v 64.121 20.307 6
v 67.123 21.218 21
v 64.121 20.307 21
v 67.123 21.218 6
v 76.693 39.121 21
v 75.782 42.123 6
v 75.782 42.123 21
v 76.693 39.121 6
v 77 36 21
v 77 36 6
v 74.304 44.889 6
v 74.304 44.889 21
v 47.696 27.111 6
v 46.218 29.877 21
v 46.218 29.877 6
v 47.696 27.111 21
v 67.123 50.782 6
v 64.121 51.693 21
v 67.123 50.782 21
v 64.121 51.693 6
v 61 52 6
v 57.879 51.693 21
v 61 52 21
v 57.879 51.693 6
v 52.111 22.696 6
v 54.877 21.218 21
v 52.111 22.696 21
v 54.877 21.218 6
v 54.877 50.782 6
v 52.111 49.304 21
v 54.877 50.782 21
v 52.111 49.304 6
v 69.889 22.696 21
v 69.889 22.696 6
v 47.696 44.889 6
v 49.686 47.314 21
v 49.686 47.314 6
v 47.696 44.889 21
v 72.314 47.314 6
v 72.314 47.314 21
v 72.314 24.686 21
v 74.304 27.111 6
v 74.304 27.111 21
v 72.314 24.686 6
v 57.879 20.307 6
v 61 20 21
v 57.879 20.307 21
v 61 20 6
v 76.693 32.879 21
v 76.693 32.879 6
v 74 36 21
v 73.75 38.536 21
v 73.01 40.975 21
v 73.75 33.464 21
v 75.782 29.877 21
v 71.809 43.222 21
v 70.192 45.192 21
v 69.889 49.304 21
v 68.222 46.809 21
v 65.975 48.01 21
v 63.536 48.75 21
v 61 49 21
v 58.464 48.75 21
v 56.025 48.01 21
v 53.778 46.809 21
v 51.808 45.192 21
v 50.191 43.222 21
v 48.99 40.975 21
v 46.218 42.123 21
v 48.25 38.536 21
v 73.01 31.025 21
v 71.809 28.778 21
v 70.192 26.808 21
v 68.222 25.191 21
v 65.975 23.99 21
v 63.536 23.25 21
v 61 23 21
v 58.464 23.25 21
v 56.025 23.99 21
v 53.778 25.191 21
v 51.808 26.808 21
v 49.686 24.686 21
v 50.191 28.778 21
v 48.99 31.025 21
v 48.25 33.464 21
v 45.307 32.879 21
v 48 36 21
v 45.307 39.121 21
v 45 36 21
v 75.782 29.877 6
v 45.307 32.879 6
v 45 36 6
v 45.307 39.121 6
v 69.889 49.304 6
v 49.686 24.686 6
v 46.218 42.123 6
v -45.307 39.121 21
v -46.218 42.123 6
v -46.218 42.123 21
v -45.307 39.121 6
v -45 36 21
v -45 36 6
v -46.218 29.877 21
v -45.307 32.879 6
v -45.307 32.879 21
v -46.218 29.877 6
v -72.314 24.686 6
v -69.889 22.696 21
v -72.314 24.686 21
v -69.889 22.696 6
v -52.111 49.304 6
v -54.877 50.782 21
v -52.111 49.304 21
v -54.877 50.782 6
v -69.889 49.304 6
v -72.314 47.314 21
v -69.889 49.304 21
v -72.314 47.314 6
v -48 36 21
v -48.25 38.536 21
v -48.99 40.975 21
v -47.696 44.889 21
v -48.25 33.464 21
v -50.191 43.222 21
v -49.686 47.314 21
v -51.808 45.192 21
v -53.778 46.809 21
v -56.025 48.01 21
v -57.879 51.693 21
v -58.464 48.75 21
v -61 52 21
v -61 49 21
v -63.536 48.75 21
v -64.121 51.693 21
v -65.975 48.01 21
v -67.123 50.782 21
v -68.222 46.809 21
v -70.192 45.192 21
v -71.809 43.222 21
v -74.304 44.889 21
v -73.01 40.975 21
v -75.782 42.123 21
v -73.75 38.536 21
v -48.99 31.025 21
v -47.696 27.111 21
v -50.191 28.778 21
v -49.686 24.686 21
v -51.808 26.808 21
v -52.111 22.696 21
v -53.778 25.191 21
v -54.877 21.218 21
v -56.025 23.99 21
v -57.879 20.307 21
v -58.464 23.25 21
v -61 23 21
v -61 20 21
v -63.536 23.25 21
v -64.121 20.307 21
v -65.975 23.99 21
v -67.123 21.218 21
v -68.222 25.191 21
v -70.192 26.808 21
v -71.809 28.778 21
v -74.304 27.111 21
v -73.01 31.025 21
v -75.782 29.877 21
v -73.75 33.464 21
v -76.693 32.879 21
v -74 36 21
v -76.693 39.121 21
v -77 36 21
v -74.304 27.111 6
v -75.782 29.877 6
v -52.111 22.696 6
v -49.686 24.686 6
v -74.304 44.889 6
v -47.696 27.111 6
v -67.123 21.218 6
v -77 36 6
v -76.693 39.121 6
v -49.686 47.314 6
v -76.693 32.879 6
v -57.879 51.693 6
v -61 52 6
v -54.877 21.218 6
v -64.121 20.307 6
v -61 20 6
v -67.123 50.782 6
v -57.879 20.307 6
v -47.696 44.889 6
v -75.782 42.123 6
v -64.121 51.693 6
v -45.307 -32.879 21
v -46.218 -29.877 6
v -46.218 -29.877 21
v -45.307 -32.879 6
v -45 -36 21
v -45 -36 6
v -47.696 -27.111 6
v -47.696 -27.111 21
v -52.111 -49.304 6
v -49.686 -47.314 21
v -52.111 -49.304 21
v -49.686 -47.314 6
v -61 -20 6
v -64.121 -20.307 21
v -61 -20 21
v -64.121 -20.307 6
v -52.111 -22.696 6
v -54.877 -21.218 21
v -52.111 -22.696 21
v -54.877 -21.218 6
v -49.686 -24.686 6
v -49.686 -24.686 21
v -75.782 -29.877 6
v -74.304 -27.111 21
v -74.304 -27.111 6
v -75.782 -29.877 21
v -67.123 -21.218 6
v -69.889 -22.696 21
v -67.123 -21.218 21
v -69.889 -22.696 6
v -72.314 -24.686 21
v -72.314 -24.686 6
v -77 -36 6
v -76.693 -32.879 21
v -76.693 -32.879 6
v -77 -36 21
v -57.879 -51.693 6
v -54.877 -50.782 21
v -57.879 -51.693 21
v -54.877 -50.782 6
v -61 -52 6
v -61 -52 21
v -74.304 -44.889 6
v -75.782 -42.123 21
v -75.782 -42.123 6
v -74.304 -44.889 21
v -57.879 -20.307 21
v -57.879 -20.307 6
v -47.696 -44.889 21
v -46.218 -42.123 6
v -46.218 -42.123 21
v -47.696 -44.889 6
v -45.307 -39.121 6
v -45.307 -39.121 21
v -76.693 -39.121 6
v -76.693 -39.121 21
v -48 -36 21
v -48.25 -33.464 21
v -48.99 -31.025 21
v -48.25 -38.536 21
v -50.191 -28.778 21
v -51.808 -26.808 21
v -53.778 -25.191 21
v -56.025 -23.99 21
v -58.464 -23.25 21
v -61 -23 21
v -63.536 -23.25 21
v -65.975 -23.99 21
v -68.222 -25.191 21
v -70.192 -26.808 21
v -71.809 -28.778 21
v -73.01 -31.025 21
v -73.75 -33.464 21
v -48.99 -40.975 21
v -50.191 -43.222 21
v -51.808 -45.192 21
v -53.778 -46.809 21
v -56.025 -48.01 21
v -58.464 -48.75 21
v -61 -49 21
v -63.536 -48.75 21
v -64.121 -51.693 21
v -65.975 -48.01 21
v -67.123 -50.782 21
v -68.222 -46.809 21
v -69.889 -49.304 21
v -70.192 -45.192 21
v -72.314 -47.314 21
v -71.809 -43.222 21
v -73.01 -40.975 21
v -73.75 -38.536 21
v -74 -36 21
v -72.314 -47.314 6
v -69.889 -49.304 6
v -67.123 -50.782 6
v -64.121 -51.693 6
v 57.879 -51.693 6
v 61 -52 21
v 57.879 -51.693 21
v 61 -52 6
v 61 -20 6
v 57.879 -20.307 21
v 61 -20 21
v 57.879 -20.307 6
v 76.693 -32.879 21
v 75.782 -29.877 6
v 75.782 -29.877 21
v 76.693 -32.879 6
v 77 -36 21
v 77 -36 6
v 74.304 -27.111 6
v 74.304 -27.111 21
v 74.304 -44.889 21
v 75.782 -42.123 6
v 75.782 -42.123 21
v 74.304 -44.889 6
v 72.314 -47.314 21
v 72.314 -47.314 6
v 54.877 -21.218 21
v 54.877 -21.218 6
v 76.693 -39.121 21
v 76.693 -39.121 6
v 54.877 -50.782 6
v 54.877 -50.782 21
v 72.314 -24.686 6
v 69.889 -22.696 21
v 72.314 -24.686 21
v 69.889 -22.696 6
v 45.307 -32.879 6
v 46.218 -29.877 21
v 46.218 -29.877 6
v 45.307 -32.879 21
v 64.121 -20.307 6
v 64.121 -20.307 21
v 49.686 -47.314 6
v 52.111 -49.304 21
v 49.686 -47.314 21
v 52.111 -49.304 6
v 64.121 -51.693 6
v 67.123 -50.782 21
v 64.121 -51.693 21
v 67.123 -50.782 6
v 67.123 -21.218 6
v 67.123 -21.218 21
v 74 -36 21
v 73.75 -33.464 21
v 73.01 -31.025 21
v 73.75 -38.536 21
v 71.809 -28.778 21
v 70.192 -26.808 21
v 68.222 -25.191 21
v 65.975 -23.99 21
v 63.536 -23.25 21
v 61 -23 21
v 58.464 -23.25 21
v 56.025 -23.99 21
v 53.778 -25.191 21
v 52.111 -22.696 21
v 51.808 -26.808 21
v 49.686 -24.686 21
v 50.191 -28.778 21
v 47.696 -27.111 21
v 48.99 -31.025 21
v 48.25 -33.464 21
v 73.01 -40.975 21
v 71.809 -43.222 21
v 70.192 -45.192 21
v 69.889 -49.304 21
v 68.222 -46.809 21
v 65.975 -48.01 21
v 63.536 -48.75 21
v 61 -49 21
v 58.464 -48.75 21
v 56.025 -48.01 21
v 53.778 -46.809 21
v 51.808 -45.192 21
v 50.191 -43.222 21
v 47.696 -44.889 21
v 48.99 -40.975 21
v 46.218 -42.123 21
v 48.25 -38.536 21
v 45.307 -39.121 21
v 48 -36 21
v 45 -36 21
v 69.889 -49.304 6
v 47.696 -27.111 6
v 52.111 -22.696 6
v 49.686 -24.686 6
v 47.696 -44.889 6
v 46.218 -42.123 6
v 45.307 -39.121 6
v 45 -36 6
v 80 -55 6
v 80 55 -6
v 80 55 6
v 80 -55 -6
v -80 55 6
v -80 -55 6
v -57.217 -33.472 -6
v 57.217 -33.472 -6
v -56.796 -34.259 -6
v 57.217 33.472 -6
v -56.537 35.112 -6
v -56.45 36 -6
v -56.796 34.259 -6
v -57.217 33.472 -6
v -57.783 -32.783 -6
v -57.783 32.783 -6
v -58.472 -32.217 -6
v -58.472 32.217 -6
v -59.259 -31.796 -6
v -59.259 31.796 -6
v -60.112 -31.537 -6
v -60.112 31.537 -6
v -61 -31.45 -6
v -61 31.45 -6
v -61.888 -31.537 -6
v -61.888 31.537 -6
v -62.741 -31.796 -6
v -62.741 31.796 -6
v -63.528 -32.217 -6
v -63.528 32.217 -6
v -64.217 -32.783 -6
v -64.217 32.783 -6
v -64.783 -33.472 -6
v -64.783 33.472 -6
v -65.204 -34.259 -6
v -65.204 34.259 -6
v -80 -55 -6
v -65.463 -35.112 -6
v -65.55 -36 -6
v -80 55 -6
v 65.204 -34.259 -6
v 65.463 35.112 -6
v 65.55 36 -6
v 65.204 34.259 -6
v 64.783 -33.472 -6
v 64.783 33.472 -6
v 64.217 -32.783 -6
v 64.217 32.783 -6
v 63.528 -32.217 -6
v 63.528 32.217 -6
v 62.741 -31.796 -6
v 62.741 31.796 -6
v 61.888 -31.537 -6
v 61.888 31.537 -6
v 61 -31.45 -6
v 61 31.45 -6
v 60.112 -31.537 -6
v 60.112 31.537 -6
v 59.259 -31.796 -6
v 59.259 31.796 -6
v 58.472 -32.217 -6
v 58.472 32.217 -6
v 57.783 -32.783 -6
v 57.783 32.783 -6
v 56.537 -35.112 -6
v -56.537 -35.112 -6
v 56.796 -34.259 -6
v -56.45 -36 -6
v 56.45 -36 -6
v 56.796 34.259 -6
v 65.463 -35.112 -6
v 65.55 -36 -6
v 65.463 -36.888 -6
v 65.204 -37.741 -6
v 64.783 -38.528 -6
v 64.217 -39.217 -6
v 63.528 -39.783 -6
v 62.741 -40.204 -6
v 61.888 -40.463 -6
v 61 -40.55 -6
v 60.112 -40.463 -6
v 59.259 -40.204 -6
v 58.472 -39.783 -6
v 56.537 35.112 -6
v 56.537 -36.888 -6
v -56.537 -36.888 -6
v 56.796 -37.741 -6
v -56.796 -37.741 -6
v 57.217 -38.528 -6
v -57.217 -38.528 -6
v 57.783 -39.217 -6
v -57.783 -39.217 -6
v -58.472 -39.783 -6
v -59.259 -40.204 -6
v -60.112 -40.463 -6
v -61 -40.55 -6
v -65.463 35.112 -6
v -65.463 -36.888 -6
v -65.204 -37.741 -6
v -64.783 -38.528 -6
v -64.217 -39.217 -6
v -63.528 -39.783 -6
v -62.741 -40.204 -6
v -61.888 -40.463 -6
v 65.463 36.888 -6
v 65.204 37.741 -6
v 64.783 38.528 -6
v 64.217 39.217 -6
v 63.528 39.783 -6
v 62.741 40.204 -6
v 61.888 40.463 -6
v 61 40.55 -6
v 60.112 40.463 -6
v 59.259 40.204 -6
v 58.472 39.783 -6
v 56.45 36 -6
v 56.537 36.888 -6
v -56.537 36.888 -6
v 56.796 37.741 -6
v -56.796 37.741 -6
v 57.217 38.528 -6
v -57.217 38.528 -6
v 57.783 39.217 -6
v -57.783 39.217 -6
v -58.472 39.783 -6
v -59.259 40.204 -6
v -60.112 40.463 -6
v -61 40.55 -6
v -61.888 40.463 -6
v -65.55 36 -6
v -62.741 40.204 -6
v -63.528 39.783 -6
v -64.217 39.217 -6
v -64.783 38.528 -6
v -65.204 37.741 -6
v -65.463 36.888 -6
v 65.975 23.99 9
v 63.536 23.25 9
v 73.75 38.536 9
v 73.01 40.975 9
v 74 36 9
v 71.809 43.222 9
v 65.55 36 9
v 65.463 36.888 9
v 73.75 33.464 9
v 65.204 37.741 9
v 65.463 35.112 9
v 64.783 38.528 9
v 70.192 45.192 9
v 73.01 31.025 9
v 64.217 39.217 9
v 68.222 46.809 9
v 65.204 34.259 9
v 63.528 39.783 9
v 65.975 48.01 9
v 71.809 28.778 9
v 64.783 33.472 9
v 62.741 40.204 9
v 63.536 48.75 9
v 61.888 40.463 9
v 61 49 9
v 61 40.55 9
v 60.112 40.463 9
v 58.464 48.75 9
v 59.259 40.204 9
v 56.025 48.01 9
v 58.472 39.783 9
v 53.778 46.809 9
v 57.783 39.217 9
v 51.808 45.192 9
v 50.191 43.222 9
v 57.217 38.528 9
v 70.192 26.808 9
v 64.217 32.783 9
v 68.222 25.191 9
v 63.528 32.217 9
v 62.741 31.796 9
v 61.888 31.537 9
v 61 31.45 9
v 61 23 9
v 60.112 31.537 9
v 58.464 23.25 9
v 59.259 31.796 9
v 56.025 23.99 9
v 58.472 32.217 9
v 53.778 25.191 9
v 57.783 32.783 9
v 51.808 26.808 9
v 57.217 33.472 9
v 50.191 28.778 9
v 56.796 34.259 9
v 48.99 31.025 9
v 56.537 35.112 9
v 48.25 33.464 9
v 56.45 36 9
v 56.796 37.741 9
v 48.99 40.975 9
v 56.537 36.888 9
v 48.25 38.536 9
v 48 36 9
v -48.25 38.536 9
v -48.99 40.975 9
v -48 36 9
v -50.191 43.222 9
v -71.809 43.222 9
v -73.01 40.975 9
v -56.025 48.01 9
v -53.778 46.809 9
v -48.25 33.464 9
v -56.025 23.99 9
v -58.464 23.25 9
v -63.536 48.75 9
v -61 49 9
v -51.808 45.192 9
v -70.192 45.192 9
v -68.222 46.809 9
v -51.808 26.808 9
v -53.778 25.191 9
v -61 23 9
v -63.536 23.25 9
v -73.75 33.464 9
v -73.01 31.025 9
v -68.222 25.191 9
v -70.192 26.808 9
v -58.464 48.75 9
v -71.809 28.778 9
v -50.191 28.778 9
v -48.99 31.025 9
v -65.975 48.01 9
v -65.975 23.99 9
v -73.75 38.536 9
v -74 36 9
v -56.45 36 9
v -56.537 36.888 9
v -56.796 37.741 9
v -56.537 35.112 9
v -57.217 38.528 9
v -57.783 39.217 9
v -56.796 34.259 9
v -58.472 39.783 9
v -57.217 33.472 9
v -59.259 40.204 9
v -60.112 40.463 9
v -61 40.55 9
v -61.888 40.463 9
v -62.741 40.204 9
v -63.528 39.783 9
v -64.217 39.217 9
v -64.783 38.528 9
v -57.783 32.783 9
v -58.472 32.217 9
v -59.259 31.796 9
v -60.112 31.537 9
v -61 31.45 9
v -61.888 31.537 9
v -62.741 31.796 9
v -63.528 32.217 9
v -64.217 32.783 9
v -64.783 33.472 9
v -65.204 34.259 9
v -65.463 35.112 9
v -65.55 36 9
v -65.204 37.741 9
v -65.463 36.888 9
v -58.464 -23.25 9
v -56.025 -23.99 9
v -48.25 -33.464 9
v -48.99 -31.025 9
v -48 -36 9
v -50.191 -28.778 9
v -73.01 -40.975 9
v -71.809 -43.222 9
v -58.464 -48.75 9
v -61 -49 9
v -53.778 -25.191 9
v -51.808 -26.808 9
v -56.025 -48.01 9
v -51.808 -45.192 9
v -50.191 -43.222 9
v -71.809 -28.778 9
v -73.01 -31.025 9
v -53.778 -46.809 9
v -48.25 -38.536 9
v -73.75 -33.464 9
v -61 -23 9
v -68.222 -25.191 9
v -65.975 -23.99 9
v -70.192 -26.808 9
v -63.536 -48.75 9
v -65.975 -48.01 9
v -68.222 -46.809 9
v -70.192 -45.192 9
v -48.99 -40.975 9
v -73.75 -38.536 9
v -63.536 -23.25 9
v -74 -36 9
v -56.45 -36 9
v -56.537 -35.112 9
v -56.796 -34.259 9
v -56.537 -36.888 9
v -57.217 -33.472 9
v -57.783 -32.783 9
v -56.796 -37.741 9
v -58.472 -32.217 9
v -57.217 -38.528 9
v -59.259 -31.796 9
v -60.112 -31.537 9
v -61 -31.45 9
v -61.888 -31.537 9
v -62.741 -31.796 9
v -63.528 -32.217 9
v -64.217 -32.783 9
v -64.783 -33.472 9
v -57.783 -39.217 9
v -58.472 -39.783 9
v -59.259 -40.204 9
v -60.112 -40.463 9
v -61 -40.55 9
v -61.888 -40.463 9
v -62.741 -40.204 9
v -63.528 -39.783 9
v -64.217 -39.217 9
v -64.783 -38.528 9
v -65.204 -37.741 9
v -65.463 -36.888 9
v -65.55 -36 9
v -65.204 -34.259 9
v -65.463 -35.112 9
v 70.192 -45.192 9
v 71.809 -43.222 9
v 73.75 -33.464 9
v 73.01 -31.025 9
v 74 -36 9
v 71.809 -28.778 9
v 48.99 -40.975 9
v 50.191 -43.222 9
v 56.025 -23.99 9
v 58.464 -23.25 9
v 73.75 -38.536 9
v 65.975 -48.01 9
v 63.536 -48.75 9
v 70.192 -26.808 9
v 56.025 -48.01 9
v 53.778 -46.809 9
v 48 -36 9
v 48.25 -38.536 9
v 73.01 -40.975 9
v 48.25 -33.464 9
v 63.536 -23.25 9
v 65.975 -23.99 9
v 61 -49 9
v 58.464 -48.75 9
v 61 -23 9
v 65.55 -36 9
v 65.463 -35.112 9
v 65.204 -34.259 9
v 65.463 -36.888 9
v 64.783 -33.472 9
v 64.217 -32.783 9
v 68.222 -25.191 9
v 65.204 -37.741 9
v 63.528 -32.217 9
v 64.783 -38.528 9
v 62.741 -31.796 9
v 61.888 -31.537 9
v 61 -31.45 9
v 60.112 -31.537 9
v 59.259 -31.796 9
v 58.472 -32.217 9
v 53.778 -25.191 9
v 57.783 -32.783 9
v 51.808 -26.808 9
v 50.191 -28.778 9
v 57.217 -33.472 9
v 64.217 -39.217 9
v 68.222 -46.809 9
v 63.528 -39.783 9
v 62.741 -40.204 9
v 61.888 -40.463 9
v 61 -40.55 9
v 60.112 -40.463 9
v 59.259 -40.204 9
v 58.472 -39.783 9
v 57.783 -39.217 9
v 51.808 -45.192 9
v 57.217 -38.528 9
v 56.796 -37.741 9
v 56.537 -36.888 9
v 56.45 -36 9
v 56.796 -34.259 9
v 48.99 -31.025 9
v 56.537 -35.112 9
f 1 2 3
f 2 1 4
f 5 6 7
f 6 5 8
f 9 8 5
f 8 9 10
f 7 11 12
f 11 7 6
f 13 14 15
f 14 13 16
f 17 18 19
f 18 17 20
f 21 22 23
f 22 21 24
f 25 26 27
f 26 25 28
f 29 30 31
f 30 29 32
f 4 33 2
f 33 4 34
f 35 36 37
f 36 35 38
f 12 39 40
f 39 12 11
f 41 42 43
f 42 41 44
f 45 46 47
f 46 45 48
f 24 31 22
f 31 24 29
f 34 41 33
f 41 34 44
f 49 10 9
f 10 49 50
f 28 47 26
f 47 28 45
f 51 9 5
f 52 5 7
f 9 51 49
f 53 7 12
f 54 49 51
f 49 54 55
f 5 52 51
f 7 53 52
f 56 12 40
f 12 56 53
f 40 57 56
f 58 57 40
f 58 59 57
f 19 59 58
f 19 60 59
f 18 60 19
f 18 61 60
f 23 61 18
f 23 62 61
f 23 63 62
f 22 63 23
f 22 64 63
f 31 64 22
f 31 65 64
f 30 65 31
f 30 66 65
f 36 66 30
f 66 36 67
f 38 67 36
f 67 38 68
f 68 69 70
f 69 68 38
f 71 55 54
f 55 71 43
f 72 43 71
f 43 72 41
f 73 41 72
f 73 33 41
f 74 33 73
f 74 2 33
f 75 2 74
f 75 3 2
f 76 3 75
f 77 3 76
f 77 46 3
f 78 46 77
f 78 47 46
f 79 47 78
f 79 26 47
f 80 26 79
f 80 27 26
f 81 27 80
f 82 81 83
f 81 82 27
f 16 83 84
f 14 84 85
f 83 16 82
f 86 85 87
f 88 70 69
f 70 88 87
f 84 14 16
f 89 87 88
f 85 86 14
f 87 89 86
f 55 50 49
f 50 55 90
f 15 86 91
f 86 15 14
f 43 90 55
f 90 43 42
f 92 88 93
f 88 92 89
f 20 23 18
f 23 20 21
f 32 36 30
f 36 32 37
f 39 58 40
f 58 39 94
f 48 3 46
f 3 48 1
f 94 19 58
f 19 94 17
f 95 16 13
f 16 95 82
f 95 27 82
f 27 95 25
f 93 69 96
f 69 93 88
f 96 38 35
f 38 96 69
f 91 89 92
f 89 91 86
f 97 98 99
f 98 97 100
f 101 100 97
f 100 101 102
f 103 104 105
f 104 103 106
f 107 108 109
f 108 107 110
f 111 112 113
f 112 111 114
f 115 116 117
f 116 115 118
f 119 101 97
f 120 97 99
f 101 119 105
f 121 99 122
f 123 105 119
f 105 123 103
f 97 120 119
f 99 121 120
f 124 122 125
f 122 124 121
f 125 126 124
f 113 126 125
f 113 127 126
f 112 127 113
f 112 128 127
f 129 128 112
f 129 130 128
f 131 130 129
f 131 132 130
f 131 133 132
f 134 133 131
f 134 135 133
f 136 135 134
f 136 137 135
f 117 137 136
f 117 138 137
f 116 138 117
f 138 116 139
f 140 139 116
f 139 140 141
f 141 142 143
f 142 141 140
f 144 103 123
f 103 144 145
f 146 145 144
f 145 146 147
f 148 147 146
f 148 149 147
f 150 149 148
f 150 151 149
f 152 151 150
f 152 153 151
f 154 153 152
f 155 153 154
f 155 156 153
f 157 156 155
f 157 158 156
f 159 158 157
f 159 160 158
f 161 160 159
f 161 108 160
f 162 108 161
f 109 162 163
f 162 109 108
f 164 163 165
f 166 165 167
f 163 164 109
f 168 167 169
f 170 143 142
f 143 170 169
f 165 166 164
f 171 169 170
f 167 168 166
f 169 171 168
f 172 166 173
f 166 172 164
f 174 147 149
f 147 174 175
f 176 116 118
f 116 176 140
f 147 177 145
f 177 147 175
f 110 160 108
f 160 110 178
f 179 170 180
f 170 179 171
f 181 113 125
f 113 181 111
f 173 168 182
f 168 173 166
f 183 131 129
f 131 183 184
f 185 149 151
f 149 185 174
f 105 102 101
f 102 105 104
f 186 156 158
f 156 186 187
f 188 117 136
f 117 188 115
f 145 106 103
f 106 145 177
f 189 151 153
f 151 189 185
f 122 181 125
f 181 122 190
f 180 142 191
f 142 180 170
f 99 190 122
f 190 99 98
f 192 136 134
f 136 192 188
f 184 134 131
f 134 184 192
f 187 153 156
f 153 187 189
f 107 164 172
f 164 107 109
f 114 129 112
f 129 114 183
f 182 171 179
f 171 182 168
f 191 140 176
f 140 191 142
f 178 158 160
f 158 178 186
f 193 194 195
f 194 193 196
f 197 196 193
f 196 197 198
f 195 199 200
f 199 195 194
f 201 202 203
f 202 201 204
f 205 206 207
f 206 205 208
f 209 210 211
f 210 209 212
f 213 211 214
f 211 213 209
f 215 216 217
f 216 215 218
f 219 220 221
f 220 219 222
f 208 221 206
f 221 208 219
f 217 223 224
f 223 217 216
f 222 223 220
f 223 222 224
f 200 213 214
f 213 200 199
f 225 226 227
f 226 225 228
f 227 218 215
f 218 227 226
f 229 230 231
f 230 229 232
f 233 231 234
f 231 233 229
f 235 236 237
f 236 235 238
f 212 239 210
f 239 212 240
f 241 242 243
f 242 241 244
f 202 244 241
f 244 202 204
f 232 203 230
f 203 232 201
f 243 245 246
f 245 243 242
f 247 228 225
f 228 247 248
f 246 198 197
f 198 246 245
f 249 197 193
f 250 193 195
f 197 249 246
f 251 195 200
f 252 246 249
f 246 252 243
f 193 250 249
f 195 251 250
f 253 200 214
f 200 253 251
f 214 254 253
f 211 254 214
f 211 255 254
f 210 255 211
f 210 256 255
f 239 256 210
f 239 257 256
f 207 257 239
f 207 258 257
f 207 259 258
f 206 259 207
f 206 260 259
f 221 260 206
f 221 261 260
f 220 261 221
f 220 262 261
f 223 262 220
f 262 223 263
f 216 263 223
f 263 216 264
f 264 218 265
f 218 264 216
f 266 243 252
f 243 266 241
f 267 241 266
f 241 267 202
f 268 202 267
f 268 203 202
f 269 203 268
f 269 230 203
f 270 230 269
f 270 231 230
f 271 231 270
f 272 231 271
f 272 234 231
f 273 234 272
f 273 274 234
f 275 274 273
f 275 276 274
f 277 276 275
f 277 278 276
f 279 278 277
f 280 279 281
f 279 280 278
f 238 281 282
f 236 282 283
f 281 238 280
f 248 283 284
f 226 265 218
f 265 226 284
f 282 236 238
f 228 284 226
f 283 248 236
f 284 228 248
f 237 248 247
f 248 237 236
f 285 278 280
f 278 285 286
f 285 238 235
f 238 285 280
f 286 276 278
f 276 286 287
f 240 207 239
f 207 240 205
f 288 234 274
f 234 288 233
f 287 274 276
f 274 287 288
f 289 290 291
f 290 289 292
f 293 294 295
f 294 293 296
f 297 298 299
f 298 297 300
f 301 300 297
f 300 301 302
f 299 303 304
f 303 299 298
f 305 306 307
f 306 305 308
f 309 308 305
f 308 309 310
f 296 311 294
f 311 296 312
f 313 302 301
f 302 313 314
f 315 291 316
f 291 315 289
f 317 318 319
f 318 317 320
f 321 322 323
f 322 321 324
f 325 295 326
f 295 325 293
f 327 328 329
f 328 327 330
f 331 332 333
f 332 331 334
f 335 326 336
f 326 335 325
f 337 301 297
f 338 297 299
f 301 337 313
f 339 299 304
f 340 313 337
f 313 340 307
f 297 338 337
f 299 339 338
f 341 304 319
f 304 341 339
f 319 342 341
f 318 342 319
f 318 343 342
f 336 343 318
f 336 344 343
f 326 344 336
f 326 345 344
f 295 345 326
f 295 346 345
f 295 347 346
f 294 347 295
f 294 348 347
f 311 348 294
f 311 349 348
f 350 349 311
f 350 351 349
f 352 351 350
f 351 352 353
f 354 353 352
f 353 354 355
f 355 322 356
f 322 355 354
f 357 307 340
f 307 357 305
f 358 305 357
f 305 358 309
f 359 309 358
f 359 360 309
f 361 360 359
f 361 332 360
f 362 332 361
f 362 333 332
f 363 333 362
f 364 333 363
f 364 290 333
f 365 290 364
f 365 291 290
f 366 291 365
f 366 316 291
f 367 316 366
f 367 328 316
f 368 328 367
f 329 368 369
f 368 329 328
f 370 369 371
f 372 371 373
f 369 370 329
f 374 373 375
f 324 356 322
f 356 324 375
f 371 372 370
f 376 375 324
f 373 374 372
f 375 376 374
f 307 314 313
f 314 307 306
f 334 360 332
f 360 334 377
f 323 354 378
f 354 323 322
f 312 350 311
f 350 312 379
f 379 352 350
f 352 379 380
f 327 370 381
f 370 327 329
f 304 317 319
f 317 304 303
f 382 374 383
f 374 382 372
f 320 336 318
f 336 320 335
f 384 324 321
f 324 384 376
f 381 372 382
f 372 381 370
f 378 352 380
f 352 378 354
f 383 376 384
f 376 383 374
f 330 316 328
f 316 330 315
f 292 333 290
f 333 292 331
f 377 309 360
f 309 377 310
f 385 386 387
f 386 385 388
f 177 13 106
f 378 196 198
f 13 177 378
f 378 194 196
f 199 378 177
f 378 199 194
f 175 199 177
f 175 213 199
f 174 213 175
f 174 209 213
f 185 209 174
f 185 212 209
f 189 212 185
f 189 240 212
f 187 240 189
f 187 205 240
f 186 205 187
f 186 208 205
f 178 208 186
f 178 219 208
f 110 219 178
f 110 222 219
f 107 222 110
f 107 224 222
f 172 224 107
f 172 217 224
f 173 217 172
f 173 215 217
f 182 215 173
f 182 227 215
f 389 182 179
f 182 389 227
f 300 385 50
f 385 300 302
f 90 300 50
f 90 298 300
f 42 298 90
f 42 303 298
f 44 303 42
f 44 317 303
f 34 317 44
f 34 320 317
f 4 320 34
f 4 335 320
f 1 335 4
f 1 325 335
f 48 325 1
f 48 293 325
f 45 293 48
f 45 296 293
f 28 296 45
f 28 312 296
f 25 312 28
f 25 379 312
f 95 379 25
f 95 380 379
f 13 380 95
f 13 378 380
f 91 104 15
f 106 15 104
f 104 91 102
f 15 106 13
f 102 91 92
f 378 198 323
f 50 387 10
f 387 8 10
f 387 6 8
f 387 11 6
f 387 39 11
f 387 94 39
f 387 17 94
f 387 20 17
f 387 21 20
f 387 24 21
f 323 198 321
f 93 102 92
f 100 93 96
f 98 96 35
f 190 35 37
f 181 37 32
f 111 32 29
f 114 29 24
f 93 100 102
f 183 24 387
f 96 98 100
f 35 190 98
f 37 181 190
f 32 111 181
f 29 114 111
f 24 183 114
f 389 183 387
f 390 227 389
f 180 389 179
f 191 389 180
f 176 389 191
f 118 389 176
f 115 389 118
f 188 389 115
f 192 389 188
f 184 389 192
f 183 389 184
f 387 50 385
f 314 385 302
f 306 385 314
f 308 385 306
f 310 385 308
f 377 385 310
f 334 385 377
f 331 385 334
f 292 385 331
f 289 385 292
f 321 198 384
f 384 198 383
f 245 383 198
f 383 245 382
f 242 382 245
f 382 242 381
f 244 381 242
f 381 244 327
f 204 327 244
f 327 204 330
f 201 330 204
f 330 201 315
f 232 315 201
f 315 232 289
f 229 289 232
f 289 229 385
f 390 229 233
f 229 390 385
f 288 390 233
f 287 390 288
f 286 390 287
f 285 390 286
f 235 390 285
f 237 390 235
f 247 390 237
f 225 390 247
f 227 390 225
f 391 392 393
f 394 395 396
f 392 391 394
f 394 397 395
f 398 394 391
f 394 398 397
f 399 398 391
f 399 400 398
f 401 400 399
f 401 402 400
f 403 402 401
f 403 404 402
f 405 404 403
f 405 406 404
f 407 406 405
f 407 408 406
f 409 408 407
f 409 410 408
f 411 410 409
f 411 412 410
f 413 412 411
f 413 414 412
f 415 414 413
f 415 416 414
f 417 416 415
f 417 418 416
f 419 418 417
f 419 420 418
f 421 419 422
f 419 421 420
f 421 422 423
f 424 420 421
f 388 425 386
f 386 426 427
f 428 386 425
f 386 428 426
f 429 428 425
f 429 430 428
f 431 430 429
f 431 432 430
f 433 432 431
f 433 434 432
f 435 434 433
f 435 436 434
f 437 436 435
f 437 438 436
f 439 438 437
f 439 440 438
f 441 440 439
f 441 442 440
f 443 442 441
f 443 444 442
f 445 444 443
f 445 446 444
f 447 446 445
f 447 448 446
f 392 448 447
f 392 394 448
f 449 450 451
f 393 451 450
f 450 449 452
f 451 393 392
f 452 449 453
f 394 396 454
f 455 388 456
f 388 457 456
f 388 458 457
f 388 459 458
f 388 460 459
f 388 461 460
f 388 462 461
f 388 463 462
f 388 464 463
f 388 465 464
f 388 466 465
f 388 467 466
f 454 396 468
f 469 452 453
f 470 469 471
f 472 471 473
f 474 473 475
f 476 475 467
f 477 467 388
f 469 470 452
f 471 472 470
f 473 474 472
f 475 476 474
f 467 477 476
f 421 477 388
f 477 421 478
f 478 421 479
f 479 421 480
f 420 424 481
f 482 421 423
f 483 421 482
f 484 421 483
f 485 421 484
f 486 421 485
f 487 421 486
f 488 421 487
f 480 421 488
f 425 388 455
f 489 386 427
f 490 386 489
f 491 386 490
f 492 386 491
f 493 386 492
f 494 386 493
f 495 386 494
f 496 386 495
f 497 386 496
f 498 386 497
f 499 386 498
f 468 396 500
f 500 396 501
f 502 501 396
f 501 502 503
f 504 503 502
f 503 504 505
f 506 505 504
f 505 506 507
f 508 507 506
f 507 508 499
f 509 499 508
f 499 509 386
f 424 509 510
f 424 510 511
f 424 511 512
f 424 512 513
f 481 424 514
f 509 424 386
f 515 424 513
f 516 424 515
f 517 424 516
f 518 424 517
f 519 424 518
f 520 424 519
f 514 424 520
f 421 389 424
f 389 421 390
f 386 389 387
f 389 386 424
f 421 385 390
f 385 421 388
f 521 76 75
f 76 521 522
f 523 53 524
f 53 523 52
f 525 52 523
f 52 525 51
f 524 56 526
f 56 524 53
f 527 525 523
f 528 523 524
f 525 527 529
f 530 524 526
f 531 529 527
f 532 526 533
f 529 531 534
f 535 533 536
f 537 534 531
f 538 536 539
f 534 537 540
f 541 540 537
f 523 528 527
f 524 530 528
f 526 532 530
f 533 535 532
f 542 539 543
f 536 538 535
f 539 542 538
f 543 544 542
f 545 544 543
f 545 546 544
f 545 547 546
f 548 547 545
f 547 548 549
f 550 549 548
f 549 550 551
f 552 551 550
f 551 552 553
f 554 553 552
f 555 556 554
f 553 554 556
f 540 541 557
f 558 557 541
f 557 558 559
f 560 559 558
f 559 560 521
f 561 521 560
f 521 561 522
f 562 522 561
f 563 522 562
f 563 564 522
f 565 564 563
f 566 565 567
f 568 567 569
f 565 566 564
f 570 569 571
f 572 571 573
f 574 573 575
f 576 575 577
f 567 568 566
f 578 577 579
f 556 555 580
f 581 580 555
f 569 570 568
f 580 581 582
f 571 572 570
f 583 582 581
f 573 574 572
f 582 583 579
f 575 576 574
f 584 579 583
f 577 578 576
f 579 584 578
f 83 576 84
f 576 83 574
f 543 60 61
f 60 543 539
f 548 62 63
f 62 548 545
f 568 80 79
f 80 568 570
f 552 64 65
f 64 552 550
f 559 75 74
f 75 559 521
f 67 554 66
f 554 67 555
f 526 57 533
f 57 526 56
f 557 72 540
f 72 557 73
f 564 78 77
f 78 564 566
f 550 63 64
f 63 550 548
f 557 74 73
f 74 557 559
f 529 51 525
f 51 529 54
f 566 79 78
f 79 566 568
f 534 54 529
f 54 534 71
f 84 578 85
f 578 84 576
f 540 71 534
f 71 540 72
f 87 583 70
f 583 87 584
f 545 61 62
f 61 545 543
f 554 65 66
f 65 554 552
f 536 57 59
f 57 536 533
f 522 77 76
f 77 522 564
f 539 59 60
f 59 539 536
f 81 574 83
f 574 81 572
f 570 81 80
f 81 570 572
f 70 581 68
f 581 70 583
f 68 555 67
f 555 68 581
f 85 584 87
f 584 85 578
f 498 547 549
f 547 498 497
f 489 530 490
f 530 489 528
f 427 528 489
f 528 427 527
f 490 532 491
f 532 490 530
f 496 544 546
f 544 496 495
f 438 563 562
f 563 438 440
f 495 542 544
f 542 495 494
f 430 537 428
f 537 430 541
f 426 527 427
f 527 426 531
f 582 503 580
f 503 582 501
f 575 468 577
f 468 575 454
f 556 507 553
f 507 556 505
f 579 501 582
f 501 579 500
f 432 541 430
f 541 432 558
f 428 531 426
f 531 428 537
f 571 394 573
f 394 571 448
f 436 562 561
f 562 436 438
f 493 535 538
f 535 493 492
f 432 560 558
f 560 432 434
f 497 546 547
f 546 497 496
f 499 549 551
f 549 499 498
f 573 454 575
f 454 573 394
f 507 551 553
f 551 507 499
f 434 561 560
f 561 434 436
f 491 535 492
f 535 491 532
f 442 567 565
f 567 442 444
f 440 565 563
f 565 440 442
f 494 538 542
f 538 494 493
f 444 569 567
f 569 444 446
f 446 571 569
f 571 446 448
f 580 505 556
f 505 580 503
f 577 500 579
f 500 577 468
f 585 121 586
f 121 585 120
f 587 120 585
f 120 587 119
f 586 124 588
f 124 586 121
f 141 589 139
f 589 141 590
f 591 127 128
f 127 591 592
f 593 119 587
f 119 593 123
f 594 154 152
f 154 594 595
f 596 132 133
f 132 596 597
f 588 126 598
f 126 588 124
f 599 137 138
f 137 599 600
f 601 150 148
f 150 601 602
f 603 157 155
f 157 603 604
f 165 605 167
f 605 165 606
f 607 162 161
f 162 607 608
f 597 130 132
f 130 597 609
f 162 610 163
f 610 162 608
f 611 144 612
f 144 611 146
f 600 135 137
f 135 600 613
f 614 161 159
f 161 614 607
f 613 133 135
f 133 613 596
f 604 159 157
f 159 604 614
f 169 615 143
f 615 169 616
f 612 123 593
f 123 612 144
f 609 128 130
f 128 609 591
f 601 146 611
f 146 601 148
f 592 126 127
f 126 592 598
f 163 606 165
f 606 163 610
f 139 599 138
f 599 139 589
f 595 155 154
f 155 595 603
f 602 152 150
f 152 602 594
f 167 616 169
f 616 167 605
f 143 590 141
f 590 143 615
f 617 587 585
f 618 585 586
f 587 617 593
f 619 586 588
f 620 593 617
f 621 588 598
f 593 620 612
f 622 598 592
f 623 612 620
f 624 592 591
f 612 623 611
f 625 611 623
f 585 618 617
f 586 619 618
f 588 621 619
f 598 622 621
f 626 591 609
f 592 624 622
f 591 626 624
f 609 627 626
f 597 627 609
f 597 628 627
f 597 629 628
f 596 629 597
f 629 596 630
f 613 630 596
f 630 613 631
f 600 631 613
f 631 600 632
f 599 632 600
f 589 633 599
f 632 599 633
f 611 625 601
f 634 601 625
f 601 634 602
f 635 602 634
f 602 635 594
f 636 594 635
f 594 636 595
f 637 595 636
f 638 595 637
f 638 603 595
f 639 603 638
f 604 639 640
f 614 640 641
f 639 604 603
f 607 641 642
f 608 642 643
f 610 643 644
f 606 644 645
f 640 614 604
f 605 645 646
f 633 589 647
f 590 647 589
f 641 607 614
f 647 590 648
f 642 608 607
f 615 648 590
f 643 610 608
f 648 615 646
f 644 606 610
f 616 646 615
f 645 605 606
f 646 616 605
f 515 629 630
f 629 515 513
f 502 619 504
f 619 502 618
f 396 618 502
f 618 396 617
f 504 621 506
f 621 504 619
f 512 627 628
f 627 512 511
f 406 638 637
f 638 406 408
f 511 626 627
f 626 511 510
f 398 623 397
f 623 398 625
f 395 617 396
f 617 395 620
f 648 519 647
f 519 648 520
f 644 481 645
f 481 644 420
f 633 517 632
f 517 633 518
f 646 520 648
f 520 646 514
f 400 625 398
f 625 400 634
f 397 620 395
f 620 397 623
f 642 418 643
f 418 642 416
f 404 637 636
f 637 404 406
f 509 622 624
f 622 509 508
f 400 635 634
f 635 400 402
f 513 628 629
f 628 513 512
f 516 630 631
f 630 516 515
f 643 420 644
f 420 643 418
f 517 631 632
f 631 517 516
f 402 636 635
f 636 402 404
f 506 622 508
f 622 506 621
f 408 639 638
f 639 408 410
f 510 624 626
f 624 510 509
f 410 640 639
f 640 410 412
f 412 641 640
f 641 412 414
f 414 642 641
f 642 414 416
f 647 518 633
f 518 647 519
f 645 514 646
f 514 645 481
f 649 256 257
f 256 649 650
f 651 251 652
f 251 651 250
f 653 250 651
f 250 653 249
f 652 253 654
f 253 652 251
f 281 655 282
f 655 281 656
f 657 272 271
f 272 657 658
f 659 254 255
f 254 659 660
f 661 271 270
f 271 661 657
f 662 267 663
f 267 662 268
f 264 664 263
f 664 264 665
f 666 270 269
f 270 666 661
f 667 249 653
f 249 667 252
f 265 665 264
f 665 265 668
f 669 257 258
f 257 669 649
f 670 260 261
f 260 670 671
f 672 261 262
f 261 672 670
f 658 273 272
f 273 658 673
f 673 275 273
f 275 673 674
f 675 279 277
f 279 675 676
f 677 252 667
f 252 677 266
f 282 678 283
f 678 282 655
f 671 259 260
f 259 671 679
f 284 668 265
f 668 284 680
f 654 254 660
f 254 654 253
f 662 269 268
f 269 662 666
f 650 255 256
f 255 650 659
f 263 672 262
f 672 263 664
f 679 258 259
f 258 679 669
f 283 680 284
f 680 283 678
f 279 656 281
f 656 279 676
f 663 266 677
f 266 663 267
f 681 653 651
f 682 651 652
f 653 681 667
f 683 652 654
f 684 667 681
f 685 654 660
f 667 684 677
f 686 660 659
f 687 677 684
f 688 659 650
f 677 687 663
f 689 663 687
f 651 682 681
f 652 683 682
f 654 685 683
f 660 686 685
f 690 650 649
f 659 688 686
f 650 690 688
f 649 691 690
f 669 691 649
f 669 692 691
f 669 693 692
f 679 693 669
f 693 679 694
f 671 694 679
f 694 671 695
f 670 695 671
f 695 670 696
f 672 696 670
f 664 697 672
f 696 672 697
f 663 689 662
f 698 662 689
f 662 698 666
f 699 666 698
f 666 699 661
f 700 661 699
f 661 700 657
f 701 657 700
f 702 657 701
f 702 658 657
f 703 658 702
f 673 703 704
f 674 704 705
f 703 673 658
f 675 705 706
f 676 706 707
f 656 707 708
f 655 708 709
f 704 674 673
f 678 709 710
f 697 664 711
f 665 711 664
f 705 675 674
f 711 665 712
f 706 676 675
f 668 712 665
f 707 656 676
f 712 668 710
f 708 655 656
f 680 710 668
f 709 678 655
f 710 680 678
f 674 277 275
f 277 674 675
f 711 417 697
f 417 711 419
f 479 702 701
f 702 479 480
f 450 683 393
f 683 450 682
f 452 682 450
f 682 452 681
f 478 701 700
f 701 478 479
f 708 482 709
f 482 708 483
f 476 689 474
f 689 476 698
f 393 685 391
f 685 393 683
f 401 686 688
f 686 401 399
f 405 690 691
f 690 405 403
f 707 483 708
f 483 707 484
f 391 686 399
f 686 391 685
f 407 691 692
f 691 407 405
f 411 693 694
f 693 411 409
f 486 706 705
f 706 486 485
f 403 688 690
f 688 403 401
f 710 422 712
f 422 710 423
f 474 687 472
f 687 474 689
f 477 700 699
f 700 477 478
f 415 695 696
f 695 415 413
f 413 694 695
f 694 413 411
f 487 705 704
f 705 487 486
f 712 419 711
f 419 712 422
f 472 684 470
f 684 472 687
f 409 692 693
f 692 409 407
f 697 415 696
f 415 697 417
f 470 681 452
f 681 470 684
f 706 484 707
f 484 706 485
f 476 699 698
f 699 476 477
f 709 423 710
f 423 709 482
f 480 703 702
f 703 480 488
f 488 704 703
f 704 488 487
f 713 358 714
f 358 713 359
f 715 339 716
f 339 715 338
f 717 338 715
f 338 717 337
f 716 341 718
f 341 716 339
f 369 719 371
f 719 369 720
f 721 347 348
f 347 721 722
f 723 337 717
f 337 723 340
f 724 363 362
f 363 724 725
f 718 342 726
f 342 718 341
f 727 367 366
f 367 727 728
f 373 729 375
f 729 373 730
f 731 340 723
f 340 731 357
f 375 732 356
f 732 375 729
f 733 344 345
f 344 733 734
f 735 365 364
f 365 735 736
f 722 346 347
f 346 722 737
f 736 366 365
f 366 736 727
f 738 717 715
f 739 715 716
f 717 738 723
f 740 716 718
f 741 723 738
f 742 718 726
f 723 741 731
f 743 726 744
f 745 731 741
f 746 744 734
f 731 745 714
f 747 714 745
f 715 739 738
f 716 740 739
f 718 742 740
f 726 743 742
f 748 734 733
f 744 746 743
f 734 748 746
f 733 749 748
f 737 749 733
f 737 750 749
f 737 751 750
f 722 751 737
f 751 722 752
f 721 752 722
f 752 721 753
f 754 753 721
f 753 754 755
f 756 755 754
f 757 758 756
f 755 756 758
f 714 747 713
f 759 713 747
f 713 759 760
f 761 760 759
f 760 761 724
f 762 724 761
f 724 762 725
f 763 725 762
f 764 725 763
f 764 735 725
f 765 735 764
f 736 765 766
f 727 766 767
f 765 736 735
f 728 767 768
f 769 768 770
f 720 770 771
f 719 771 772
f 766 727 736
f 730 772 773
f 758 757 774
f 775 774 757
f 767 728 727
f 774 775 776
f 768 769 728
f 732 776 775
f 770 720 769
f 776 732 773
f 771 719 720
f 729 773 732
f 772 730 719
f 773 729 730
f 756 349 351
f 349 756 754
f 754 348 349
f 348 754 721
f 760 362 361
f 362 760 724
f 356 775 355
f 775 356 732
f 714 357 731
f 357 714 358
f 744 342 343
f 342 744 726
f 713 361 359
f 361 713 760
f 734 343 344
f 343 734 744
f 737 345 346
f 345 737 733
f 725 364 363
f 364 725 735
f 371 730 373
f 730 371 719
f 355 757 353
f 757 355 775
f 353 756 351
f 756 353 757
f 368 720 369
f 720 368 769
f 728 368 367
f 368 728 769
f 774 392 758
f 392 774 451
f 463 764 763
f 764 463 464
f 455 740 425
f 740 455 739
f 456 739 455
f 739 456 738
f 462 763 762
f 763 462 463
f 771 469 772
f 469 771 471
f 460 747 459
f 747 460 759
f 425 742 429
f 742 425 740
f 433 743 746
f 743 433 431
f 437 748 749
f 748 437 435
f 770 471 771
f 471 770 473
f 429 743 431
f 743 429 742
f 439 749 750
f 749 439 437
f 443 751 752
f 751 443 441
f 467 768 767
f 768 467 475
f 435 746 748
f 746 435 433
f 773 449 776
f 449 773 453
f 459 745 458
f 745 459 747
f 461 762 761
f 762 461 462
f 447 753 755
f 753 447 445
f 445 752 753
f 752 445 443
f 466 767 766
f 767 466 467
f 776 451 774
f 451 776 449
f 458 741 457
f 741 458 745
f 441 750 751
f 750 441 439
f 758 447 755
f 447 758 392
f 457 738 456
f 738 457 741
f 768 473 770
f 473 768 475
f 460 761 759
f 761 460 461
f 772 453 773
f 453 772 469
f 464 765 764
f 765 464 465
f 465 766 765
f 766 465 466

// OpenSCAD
$fn = 32;

// ----------------------------------------------------------------------
// Socket pad plate
// bosses with counterbored sockets for the screws
// ----------------------------------------------------------------------

// --- parameters (mm) ---
base_t = 12;             // base plate thickness
boss_h = 15;             // boss height above the base plate
boss_d = 32;             // boss diameter
socket_d = 26;           // socket diameter
socket_depth = 12;       // socket depth from the boss face
bolt_d = 9.1;            // screw clearance hole through the socket floor
plate = [160, 110, 12];  // overall size (x, y, z)
edge = 19;               // boss centre offset from the plate edge
pads = 4;                // boss count, one per corner

// --- derived feature positions (mm) ---
height = base_t + boss_h;        // = 27   overall height of the part
corner_x = plate[0] / 2 - edge;  // = 61   boss centre X
corner_y = plate[1] / 2 - edge;  // = 36   boss centre Y
feature_centers = [
  [corner_x, corner_y],
  [-corner_x, corner_y],
  [-corner_x, -corner_y],
  [corner_x, -corner_y]
];   // boss centres: sockets, holes and the pads themselves are placed from here

// base plate, bosses on feature_centers, socket + through hole in each
difference() {
  union() {
    cube(plate, center = true);
    for (centre = feature_centers)
      translate([centre[0], centre[1], plate[2] / 2 - 1])
        cylinder(d = boss_d, h = boss_h + 1);
  }
  for (centre = feature_centers) {
    translate([centre[0], centre[1], plate[2] / 2 + boss_h - socket_depth])
      cylinder(d = socket_d, h = socket_depth + 1);
    translate([centre[0], centre[1], -height])
      cylinder(d = bolt_d, h = 2 * height + 2);  // through the socket floor
  }
}
